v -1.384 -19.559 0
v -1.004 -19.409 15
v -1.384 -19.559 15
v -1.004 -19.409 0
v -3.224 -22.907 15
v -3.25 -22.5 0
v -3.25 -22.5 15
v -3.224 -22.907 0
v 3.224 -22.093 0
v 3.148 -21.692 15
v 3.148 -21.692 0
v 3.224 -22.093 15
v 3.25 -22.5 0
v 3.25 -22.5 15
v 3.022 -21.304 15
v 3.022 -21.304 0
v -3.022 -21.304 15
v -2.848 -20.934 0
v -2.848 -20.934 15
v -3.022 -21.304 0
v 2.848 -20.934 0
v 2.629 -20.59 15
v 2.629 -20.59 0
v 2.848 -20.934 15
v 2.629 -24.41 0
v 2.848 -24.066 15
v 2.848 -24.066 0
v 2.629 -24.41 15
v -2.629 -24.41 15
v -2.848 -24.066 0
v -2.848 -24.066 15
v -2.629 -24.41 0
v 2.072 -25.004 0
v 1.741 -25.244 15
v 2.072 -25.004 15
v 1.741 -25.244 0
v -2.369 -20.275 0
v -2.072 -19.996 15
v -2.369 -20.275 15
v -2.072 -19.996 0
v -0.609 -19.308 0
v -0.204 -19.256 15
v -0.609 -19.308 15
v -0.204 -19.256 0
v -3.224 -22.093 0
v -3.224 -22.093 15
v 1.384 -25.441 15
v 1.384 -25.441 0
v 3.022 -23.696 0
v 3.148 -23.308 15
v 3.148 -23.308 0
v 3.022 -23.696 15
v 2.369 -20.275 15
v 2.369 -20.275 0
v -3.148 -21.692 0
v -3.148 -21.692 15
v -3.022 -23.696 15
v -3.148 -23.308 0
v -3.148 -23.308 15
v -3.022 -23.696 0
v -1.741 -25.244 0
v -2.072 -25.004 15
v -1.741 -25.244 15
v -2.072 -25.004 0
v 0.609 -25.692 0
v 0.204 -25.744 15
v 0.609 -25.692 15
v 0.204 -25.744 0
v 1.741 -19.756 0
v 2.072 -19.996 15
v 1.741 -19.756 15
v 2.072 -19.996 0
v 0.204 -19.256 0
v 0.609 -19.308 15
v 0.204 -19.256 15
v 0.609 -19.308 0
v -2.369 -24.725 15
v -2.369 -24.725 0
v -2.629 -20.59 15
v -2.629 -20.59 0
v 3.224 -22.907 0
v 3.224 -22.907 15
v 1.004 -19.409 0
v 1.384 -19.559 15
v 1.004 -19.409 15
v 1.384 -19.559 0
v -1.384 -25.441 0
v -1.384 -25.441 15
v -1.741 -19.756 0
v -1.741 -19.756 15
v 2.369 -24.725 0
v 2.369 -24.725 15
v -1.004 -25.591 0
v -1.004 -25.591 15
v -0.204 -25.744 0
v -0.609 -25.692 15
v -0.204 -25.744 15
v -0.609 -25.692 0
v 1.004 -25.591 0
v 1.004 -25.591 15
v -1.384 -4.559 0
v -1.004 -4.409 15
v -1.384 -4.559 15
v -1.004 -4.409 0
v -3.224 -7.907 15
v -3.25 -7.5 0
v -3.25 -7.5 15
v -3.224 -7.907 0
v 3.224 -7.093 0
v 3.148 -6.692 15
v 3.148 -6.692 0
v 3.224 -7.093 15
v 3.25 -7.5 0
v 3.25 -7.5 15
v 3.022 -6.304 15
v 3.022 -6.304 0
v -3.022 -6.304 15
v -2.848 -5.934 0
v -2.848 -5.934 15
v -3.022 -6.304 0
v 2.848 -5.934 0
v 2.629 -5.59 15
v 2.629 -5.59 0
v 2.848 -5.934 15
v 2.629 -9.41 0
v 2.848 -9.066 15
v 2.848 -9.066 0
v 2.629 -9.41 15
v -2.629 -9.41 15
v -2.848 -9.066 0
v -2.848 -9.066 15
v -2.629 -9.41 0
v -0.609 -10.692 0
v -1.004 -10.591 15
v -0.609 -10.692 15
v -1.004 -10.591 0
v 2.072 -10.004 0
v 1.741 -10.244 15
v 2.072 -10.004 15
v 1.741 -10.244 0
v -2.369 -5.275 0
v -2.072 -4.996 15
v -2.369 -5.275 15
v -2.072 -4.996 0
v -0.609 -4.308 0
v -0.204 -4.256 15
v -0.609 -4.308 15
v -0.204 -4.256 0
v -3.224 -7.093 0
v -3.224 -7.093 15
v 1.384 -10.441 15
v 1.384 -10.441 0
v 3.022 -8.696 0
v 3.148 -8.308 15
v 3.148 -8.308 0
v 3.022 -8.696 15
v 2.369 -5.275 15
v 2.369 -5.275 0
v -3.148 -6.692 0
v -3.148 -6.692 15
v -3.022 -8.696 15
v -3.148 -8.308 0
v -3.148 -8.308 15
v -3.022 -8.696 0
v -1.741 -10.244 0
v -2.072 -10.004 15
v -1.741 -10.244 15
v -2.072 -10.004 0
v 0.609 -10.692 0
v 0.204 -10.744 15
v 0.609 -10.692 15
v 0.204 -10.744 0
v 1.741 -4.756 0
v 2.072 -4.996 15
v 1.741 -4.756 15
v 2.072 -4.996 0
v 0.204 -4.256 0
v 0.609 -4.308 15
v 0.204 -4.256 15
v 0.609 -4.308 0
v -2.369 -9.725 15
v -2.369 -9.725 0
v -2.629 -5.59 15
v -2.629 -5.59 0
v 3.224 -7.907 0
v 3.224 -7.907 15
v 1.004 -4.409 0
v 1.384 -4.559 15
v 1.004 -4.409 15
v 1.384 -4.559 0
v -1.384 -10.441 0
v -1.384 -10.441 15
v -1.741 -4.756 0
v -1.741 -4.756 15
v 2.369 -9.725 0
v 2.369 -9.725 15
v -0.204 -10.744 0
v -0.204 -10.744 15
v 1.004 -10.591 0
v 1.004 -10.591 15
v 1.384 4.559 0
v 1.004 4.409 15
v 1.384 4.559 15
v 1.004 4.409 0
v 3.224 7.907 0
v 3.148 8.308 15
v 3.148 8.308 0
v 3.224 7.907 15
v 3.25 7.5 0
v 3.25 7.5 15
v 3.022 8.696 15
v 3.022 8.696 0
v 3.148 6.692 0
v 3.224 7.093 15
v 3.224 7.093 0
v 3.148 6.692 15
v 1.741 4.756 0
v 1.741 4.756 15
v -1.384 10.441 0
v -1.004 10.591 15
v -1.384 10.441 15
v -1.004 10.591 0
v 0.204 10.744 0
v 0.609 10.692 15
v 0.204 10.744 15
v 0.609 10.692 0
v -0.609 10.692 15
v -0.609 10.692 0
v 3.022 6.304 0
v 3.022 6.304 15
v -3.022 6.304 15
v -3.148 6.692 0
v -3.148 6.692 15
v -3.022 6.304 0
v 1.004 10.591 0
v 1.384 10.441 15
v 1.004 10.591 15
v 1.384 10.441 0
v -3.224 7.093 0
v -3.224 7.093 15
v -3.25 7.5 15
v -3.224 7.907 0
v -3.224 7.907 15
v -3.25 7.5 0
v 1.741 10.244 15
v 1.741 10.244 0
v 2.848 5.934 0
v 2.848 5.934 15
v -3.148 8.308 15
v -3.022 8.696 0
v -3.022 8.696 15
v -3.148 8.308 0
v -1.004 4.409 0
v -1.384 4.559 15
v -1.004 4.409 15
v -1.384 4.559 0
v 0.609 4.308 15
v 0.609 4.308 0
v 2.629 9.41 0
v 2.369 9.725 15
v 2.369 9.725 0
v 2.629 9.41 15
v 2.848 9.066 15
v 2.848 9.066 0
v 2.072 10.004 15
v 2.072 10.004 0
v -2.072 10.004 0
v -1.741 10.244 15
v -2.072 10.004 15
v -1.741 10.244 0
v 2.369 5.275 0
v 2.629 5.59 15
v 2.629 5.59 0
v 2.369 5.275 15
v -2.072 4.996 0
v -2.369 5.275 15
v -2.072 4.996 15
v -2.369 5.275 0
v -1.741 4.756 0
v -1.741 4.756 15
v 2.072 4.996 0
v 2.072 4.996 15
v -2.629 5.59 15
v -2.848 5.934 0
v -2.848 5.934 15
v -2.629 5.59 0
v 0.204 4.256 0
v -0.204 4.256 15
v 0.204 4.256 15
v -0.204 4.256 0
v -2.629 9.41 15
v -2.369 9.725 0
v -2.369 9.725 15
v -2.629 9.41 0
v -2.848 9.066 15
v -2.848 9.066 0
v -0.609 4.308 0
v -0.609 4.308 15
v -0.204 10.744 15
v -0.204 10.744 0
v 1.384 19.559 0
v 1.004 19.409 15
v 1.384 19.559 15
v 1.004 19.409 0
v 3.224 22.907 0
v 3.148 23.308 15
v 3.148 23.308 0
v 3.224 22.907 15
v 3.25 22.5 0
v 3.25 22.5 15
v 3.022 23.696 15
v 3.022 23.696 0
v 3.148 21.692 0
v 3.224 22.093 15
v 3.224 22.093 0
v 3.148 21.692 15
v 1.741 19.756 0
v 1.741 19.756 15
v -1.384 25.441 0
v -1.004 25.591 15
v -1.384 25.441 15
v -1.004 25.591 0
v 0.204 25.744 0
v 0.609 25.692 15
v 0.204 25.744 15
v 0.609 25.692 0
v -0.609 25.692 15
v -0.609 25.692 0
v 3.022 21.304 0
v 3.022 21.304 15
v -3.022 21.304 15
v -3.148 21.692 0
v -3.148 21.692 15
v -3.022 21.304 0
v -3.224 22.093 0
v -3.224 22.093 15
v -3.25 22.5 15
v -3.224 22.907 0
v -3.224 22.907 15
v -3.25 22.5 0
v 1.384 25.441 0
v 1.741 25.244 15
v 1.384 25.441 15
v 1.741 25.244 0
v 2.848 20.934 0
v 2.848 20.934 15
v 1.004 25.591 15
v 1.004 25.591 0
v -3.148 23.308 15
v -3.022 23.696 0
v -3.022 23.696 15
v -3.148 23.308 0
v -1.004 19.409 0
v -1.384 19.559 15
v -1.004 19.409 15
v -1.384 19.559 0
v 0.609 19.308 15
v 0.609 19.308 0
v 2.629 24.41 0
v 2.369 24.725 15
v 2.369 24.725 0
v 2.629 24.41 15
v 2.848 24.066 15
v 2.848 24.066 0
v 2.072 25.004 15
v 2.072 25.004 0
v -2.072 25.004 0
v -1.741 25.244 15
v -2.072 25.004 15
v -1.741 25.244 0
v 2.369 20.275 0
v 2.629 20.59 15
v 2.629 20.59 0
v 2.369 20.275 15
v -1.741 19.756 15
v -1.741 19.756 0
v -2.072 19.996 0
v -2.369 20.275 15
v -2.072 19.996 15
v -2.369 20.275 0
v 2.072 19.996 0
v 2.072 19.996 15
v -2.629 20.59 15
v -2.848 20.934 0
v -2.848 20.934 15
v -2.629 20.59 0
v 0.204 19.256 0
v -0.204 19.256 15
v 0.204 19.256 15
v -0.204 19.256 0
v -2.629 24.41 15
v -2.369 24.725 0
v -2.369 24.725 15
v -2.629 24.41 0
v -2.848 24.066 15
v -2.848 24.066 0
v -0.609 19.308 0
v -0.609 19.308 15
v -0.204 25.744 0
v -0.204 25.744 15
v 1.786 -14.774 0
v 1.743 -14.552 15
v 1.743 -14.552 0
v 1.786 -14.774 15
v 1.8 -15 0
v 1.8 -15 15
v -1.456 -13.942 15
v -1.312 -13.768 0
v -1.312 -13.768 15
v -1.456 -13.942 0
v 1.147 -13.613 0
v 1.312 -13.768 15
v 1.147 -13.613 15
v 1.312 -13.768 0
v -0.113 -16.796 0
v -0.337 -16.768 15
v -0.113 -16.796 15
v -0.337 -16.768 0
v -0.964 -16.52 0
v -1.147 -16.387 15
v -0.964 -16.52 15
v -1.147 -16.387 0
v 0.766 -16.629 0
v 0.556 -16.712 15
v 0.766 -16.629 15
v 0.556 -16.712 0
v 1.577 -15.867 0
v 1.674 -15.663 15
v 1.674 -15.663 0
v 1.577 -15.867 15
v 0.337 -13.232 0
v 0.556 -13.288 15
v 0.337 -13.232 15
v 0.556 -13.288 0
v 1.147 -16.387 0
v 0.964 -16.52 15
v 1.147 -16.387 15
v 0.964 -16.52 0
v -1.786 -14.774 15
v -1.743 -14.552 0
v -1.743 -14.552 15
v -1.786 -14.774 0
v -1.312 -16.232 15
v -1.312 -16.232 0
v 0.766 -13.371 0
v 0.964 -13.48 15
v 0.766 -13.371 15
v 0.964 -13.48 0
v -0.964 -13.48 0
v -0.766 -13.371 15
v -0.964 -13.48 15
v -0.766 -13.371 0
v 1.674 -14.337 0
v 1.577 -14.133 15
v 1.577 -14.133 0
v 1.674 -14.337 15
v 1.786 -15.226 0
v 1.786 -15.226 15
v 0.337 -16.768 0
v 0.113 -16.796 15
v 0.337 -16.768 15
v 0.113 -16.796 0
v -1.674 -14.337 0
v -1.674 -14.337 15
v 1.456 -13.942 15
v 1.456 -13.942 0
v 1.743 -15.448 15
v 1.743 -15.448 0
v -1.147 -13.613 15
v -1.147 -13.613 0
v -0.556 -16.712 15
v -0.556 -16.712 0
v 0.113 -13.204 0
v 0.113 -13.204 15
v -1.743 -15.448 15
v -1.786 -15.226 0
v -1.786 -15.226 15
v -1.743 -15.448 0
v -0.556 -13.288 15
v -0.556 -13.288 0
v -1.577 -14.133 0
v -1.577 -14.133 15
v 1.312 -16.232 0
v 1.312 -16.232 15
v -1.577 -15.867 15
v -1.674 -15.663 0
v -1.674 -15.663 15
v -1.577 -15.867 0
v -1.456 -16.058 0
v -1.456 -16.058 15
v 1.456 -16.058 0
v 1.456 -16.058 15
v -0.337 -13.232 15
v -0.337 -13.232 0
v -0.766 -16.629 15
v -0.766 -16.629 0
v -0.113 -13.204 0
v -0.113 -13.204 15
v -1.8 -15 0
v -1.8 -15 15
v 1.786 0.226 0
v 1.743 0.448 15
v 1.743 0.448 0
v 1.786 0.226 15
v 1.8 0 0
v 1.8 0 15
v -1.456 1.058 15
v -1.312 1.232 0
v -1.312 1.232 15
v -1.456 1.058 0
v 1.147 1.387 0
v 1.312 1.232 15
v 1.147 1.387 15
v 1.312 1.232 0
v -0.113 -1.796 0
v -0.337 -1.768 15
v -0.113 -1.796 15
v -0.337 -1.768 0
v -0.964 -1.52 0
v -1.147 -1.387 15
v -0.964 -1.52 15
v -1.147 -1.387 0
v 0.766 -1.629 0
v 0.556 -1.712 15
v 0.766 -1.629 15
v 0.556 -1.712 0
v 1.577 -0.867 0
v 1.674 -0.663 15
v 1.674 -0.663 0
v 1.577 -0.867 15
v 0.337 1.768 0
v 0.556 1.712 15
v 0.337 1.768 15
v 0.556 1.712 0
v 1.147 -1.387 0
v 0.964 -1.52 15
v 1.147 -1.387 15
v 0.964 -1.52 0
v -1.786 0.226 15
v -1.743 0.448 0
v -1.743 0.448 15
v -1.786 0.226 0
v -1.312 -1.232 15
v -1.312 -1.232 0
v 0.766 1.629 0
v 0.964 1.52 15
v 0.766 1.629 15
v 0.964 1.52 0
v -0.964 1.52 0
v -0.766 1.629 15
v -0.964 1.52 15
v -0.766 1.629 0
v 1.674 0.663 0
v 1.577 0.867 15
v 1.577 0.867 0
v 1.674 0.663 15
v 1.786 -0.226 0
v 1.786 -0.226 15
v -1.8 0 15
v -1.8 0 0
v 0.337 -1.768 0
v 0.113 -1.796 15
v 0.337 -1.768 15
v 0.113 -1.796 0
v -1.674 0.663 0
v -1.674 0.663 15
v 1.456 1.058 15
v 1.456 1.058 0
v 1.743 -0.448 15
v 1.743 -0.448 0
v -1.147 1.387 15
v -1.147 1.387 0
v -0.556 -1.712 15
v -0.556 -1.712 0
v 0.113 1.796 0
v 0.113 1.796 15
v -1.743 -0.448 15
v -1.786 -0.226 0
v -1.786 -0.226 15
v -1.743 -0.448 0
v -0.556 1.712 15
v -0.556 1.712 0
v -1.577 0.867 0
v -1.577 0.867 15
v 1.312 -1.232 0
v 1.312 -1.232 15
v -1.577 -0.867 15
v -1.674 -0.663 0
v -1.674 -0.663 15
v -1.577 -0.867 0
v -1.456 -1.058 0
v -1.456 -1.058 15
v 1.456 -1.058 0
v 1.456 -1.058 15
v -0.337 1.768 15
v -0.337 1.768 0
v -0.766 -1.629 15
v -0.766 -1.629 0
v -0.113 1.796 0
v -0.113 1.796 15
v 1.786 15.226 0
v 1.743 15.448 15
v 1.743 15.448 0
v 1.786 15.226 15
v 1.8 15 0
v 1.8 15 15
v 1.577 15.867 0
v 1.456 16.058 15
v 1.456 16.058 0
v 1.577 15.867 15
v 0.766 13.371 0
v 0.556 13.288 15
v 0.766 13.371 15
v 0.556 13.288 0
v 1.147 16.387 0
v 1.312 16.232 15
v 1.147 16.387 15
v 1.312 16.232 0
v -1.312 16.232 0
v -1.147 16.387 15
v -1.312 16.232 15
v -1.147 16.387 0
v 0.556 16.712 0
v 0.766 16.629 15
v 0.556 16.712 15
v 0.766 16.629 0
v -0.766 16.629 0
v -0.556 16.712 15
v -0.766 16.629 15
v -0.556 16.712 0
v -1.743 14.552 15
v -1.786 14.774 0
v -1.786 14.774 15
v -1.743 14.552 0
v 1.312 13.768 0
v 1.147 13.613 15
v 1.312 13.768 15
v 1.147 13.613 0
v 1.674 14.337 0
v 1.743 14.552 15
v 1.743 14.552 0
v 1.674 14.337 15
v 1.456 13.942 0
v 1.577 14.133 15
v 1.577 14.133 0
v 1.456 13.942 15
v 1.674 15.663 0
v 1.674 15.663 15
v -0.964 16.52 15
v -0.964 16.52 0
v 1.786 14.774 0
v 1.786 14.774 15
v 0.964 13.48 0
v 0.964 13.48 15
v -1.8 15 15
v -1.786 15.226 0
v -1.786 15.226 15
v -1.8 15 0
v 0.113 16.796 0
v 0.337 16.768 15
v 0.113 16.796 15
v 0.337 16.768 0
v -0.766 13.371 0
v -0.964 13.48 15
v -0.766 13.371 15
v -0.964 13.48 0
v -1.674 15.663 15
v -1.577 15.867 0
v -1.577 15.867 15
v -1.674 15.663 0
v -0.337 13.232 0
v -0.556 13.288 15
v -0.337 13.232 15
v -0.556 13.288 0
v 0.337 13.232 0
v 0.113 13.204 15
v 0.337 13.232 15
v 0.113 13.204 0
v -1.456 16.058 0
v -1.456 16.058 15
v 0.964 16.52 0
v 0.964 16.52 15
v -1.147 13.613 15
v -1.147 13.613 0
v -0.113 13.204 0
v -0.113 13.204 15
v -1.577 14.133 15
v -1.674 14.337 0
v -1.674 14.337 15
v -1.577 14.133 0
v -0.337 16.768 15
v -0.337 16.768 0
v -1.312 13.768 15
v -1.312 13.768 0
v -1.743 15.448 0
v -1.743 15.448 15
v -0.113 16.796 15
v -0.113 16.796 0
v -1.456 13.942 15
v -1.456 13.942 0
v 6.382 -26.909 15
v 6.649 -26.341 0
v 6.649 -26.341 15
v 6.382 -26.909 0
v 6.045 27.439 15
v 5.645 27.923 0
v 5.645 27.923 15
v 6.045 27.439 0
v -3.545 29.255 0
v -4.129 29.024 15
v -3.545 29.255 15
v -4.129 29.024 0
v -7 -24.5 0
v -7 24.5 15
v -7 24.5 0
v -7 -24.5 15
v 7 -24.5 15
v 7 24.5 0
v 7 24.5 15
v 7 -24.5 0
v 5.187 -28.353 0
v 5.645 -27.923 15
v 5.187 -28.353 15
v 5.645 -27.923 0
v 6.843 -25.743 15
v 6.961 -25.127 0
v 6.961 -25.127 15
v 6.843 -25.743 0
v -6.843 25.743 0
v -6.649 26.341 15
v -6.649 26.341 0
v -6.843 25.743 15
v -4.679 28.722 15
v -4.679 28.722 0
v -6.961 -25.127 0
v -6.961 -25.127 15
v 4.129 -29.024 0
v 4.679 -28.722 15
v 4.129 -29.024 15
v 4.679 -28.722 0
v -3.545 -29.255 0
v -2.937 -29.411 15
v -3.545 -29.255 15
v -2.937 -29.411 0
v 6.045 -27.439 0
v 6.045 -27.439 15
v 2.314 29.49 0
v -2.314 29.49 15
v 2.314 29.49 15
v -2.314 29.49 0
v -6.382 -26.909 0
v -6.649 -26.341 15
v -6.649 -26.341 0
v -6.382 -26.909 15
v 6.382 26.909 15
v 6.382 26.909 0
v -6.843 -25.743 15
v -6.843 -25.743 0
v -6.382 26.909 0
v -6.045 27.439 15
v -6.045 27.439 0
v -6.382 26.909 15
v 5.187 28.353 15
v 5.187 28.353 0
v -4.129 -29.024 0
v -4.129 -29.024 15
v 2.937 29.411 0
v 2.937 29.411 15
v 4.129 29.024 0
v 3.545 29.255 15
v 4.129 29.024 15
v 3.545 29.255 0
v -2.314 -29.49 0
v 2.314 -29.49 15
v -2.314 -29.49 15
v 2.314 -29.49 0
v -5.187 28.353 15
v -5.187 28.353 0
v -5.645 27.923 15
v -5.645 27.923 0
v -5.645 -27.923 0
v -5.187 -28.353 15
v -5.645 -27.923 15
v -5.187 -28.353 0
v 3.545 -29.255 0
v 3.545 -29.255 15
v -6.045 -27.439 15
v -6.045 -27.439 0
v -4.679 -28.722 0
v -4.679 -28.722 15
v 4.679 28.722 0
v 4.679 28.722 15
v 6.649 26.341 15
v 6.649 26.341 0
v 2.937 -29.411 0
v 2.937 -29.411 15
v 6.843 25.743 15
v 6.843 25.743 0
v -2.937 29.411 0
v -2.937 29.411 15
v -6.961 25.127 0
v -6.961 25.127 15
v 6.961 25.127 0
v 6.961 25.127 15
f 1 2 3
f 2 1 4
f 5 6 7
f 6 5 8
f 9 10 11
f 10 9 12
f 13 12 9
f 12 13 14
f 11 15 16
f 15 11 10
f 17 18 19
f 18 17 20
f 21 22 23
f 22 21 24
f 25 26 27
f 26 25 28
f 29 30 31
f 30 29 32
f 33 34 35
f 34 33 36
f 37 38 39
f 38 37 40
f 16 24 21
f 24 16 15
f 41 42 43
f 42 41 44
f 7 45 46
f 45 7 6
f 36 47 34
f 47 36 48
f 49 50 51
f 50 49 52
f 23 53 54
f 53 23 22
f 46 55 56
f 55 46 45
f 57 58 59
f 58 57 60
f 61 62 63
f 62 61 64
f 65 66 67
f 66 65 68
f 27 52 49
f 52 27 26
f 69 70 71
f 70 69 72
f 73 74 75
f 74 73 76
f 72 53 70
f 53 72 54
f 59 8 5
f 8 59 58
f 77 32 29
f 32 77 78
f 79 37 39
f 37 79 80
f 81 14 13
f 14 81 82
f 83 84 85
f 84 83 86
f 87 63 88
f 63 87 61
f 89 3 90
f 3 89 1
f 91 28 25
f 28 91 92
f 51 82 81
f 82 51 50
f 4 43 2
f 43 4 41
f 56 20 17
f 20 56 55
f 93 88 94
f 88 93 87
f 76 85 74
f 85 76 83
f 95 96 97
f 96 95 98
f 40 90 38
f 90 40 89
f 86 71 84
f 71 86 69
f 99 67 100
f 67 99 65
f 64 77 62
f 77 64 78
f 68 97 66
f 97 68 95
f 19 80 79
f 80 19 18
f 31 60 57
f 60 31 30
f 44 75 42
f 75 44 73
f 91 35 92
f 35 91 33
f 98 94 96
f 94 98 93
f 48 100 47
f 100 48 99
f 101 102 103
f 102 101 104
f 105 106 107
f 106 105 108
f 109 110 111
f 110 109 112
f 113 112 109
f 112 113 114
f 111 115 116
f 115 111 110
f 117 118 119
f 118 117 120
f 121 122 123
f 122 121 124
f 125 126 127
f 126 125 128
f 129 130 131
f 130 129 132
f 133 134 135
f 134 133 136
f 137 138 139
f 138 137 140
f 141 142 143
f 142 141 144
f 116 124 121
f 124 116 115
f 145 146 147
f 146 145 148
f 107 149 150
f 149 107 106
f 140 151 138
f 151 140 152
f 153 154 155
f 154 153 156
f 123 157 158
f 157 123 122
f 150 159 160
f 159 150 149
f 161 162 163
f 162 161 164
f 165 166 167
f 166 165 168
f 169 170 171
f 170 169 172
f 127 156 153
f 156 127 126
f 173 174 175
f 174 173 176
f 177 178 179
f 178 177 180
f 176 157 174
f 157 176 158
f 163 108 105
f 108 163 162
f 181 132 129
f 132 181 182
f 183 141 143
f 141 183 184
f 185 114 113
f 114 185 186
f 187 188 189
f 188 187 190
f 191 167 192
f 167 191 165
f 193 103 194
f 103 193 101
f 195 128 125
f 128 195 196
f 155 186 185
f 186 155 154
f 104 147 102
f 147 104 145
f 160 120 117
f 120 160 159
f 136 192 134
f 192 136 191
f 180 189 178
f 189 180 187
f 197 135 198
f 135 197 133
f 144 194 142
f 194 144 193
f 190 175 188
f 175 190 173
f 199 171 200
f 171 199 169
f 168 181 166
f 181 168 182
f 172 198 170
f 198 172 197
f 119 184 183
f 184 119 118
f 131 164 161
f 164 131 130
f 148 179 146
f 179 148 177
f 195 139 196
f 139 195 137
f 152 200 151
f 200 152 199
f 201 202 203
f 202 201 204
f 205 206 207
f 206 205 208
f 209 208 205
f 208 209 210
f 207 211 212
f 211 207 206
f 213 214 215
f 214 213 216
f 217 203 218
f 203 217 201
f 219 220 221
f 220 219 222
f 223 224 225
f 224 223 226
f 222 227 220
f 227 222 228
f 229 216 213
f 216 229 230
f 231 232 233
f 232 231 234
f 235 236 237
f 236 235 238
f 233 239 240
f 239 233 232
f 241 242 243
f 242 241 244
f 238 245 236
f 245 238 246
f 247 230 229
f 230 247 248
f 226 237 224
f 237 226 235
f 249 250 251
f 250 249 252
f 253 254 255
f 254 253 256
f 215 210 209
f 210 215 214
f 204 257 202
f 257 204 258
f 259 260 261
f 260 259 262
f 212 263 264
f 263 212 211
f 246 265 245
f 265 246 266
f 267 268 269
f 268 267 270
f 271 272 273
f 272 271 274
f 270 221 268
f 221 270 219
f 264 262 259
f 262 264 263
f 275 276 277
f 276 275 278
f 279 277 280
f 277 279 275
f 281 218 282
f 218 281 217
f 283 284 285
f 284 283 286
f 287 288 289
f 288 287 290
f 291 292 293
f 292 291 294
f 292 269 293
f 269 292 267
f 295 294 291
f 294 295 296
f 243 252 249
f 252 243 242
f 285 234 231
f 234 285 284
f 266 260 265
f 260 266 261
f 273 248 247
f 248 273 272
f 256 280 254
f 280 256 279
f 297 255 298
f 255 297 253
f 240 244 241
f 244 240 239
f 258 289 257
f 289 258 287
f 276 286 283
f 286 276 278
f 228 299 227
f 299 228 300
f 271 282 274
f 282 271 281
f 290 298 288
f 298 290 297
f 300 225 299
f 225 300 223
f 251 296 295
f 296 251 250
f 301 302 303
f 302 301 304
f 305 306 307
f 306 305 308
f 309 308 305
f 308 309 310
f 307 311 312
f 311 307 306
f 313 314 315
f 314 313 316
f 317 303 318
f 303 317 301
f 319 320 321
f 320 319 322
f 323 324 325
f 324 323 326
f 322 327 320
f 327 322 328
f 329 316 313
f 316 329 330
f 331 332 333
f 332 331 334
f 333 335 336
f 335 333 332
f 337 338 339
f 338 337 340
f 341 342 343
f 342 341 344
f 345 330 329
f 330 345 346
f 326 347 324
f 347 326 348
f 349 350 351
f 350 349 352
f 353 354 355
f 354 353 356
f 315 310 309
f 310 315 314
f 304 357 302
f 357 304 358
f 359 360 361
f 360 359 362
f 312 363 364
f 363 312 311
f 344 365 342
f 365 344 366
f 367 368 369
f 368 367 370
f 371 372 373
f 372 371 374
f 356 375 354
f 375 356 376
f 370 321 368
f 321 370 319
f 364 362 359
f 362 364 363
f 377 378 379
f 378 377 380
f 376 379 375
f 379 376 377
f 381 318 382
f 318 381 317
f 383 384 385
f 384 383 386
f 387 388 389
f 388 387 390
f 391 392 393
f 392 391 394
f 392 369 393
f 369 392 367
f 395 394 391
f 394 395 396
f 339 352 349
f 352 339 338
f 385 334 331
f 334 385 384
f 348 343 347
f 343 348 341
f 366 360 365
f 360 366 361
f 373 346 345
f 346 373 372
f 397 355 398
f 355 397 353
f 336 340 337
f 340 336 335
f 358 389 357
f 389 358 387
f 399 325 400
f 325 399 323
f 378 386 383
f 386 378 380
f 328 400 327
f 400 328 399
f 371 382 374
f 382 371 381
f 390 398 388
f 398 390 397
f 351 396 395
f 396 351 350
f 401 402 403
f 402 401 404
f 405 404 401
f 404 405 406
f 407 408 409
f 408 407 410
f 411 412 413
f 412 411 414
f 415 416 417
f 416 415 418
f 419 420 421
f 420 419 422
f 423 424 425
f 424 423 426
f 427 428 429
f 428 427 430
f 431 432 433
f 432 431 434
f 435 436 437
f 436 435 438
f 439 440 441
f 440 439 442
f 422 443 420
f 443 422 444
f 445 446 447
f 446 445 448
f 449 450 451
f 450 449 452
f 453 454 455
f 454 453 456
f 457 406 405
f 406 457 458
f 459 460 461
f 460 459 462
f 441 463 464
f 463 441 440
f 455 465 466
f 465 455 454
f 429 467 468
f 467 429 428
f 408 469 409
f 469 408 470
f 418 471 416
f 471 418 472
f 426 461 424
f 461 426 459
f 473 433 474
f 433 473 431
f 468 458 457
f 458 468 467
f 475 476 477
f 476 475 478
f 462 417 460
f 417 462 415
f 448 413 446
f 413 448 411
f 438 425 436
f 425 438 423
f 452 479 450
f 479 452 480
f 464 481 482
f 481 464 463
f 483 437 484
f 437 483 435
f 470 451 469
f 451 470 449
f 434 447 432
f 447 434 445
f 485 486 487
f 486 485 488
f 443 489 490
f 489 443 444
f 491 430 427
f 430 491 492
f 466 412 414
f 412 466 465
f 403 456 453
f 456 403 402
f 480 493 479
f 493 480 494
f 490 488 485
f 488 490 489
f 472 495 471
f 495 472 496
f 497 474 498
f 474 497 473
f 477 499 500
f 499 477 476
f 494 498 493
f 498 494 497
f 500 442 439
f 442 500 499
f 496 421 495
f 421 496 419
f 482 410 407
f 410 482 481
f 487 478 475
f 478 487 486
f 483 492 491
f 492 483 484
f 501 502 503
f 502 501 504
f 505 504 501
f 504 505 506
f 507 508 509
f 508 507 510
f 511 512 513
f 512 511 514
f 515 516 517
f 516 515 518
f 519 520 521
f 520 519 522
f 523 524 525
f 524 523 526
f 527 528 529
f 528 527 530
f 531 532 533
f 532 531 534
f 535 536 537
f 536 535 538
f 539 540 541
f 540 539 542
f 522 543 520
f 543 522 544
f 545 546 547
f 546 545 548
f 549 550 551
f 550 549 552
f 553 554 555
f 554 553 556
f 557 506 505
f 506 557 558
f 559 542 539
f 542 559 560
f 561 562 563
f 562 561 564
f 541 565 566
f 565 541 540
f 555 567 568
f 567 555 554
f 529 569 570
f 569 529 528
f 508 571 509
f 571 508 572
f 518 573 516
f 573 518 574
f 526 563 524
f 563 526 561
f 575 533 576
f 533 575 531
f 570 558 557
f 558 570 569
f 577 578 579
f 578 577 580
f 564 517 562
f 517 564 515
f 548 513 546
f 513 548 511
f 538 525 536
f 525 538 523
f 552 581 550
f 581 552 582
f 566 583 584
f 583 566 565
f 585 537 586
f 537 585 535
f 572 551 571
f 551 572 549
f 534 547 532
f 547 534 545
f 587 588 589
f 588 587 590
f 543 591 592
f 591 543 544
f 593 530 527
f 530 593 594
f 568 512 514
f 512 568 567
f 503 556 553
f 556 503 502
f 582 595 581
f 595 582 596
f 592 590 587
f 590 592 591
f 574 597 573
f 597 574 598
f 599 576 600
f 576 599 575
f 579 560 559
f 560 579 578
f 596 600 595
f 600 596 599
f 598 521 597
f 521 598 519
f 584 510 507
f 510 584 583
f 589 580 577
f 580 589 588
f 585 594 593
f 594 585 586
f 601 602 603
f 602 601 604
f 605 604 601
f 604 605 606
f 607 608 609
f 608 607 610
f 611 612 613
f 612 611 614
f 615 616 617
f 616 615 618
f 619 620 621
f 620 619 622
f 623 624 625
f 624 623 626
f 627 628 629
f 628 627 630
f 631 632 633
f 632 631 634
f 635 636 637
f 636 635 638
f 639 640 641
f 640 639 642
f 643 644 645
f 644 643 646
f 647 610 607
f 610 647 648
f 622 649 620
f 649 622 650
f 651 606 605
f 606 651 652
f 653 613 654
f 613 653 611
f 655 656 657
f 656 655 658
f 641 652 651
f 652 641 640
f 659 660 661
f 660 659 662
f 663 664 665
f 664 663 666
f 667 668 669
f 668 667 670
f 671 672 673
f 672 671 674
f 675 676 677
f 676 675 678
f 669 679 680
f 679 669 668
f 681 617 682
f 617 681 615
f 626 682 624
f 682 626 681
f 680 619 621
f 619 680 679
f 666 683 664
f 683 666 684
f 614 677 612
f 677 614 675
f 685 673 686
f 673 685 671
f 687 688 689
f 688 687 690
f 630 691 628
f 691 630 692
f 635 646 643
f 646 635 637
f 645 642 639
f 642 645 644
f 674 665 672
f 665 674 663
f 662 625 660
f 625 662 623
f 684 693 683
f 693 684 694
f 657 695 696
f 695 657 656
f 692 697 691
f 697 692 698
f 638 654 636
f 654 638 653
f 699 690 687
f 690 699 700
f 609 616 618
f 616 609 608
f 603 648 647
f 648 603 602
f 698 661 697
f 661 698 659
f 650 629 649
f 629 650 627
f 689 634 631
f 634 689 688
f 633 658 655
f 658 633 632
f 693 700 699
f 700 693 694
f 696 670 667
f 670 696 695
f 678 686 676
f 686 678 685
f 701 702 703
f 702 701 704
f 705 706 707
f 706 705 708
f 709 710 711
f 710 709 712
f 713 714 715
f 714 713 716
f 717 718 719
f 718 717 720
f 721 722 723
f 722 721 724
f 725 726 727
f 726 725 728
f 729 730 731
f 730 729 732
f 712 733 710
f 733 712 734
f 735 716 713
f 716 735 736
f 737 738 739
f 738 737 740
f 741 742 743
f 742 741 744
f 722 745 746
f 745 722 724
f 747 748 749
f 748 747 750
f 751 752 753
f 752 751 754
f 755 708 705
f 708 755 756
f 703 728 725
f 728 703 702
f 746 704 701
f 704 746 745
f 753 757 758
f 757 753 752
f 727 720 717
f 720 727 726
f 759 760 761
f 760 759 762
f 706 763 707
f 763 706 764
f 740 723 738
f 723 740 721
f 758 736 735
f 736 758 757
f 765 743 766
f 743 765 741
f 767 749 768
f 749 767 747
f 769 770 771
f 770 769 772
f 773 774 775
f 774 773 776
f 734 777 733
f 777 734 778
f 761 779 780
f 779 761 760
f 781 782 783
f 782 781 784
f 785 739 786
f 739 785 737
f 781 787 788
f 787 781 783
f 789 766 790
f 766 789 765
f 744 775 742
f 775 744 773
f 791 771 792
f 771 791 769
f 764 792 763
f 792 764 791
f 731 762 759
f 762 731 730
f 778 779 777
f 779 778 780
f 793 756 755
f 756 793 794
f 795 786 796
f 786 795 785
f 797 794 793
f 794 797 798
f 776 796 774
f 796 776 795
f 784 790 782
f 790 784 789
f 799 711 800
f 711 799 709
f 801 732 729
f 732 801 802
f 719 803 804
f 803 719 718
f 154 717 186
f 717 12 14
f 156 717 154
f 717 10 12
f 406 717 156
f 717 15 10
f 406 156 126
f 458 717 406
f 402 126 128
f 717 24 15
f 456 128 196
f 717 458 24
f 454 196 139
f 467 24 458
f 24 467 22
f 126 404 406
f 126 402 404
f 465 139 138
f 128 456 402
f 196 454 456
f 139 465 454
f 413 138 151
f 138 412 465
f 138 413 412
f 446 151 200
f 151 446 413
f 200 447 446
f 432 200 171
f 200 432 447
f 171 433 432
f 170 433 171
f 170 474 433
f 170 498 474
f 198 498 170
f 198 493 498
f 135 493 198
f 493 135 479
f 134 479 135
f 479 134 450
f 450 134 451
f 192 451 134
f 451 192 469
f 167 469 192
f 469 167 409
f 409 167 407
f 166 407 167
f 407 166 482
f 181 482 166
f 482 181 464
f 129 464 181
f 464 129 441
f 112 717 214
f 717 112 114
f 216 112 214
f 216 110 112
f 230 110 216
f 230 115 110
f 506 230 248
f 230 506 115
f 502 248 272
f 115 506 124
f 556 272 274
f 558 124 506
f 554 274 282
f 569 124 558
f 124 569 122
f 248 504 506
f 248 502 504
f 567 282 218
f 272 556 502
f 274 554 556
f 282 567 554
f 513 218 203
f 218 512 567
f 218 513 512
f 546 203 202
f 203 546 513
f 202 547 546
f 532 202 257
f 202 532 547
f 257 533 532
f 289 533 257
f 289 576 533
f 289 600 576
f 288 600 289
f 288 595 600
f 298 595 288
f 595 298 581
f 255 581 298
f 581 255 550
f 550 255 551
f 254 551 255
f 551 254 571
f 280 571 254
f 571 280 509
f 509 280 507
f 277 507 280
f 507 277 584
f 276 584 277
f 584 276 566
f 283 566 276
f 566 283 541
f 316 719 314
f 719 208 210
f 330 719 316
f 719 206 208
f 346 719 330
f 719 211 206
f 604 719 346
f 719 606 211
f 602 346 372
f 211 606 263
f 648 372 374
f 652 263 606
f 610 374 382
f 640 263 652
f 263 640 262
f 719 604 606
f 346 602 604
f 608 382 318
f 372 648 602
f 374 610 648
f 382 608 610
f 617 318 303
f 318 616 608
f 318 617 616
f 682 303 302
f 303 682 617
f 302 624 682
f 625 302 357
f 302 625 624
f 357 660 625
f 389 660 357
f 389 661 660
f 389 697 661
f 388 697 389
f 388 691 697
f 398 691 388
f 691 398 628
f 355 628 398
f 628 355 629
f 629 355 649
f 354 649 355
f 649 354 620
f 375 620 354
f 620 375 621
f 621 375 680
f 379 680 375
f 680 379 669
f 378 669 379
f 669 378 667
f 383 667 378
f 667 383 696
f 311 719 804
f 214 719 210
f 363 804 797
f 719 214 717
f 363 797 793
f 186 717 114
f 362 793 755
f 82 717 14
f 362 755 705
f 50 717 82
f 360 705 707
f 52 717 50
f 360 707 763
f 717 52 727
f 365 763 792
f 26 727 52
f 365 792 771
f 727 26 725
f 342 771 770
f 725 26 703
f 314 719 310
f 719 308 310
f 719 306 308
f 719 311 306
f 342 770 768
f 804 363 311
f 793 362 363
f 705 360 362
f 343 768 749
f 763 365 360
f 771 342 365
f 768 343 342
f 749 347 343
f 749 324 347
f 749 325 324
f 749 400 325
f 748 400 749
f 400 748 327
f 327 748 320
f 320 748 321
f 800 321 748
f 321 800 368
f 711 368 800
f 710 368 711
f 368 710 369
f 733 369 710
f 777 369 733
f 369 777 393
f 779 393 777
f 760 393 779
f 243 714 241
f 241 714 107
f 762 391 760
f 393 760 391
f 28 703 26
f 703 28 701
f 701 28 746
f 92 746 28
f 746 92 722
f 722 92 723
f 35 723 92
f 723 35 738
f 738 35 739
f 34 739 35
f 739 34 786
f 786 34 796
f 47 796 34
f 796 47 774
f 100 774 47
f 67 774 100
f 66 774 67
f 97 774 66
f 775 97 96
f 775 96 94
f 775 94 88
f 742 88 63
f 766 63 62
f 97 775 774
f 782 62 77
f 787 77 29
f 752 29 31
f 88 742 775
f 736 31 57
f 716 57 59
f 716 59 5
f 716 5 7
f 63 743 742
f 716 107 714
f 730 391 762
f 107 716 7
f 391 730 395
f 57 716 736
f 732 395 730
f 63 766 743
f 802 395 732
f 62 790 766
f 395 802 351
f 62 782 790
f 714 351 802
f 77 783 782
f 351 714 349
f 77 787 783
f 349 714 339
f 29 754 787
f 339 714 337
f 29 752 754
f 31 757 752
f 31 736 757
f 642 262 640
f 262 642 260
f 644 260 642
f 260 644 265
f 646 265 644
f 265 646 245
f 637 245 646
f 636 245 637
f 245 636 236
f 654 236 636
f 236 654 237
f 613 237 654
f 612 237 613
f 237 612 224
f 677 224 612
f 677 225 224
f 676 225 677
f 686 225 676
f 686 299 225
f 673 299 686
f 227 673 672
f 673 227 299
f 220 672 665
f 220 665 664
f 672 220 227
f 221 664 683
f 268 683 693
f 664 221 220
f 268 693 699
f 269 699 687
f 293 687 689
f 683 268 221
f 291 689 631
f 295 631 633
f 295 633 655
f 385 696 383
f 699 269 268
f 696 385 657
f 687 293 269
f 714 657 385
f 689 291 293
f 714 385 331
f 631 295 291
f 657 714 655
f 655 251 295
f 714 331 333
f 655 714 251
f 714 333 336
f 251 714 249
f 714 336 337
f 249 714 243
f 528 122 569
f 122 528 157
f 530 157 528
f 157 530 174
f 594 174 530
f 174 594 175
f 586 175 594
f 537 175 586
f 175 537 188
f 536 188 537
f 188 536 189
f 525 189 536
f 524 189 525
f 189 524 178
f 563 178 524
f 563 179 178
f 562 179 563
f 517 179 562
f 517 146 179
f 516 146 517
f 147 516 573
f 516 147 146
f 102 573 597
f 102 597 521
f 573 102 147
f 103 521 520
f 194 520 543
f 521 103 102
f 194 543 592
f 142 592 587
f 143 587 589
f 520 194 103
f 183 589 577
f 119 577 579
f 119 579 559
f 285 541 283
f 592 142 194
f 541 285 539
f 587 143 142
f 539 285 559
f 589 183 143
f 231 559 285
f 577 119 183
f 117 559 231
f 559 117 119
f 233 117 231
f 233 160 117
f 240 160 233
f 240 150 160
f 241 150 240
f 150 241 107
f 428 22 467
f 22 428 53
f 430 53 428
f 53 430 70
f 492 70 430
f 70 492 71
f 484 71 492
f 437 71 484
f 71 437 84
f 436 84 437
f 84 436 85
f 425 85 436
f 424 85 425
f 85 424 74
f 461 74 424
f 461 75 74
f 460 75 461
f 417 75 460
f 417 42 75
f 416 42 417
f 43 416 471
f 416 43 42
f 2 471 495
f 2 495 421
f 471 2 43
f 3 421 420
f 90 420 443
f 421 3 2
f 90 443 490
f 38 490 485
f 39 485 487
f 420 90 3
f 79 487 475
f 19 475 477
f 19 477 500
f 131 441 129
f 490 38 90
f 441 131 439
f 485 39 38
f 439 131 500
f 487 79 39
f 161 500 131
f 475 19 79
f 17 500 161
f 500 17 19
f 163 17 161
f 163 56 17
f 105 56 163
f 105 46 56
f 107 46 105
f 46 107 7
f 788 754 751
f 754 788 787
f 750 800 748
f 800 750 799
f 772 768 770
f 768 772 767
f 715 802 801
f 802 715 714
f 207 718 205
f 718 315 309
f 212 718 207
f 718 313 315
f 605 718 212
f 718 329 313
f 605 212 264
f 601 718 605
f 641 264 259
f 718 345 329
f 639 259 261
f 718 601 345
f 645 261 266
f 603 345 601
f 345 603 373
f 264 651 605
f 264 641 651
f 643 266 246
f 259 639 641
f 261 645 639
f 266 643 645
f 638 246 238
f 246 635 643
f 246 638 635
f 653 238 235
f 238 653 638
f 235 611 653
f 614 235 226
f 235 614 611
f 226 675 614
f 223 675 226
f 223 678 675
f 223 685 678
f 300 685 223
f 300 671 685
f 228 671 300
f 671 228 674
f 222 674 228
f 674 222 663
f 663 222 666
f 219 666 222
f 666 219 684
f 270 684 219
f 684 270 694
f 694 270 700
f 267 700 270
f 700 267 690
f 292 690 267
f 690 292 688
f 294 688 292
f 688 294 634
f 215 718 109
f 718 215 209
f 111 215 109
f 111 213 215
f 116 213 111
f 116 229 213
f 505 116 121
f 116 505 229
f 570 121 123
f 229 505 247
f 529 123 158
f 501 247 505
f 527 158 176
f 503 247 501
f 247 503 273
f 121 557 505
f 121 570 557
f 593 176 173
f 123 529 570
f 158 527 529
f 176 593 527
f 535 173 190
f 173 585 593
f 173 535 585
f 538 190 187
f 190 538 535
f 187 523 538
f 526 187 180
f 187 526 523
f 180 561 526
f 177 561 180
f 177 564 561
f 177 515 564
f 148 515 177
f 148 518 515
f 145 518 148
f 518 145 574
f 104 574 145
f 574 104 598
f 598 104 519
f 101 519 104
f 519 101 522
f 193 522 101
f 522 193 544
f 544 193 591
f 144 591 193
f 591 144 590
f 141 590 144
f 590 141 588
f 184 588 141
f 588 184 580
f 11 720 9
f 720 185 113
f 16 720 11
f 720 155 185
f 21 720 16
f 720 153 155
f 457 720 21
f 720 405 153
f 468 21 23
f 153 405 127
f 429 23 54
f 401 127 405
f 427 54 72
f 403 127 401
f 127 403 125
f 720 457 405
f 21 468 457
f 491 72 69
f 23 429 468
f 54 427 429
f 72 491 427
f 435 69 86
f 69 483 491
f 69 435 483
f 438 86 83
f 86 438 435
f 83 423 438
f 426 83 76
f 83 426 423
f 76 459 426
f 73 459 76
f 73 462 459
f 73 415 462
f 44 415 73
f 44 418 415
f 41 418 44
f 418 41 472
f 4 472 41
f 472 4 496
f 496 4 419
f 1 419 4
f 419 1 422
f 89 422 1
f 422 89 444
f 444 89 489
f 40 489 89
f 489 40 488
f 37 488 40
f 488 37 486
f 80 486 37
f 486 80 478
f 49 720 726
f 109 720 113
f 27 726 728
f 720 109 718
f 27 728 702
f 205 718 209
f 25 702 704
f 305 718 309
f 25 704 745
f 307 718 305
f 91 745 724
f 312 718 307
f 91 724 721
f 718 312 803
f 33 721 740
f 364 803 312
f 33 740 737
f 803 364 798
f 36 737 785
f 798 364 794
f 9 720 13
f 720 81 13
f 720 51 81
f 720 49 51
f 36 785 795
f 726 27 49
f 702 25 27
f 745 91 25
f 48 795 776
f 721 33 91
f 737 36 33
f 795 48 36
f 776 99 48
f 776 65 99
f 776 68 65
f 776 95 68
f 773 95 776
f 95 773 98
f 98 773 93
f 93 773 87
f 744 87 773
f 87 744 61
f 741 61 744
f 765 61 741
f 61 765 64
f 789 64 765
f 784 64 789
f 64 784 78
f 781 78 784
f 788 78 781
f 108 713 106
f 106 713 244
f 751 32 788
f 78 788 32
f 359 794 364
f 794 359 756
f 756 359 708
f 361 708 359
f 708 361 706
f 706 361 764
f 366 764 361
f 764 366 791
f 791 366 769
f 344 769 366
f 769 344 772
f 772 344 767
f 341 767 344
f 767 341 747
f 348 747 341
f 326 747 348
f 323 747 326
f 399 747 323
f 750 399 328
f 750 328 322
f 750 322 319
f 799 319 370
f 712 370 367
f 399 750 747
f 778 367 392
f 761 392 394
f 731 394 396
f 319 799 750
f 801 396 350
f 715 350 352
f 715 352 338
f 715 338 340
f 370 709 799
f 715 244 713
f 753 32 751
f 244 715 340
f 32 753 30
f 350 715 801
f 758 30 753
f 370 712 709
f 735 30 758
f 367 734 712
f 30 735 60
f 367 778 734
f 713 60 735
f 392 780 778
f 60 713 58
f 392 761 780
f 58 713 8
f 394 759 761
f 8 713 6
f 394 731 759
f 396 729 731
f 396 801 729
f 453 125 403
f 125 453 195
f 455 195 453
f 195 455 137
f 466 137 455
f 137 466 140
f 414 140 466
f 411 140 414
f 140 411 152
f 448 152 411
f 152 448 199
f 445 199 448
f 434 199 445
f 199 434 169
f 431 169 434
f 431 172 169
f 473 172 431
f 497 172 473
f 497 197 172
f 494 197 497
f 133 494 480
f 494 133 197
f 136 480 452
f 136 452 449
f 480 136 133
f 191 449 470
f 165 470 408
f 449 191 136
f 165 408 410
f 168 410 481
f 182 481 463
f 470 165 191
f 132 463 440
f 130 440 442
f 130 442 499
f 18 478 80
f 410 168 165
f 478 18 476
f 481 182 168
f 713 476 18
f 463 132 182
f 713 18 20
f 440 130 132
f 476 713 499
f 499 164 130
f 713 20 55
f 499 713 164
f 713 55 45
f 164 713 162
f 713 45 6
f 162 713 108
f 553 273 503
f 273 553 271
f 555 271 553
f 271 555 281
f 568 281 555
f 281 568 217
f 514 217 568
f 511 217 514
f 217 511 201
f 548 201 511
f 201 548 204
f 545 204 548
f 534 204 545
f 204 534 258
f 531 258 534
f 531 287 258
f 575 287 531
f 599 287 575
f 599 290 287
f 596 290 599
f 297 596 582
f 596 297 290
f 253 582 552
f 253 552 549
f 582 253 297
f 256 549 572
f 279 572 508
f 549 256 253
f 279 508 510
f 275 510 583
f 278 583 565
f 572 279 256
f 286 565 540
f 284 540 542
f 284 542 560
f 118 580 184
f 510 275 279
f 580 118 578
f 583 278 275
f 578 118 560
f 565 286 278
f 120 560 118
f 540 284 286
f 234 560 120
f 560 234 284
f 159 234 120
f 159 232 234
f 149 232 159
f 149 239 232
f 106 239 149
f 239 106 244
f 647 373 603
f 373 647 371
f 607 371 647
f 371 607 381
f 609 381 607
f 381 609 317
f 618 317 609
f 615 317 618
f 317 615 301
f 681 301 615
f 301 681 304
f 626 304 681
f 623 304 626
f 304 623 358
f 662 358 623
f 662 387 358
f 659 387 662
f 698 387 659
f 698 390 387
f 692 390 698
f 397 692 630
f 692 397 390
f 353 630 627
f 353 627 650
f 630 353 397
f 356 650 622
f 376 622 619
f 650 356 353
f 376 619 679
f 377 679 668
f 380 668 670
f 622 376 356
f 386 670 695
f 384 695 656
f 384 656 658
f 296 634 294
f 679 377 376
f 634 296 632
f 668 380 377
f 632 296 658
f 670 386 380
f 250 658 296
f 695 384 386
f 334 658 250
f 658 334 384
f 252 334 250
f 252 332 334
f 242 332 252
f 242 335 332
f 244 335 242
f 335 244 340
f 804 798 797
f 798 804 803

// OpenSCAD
$fn = 50;

difference() {
	union() {
		hull() {
			translate(v = [-2.0, 24.5, 0]) {
				cylinder(h = 15, r = 5);
			}
			translate(v = [2.0, 24.5, 0]) {
				cylinder(h = 15, r = 5);
			}
			translate(v = [-2.0, -24.5, 0]) {
				cylinder(h = 15, r = 5);
			}
			translate(v = [2.0, -24.5, 0]) {
				cylinder(h = 15, r = 5);
			}
		}
	}
	union() {
		translate(v = [0.0, -22.5, 0]) {
			translate(v = [0, 0, -100]) {
				cylinder(h = 200, r = 3.25);
			}
		}
		translate(v = [0.0, -7.5, 0]) {
			translate(v = [0, 0, -100]) {
				cylinder(h = 200, r = 3.25);
			}
		}
		translate(v = [0.0, 7.5, 0]) {
			translate(v = [0, 0, -100]) {
				cylinder(h = 200, r = 3.25);
			}
		}
		translate(v = [0.0, 22.5, 0]) {
			translate(v = [0, 0, -100]) {
				cylinder(h = 200, r = 3.25);
			}
		}
		translate(v = [0.0, -22.5, 0]) {
			translate(v = [0, 0, -100]) {
				cylinder(h = 200, r = 1.8);
			}
		}
		translate(v = [0.0, -15.0, 0]) {
			translate(v = [0, 0, -100]) {
				cylinder(h = 200, r = 1.8);
			}
		}
		translate(v = [0.0, -7.5, 0]) {
			translate(v = [0, 0, -100]) {
				cylinder(h = 200, r = 1.8);
			}
		}
		translate(v = [0, 0, -100]) {
			cylinder(h = 200, r = 1.8);
		}
		translate(v = [0.0, 7.5, 0]) {
			translate(v = [0, 0, -100]) {
				cylinder(h = 200, r = 1.8);
			}
		}
		translate(v = [0.0, 15.0, 0]) {
			translate(v = [0, 0, -100]) {
				cylinder(h = 200, r = 1.8);
			}
		}
		translate(v = [0.0, 22.5, 0]) {
			translate(v = [0, 0, -100]) {
				cylinder(h = 200, r = 1.8);
			}
		}
	}
}
